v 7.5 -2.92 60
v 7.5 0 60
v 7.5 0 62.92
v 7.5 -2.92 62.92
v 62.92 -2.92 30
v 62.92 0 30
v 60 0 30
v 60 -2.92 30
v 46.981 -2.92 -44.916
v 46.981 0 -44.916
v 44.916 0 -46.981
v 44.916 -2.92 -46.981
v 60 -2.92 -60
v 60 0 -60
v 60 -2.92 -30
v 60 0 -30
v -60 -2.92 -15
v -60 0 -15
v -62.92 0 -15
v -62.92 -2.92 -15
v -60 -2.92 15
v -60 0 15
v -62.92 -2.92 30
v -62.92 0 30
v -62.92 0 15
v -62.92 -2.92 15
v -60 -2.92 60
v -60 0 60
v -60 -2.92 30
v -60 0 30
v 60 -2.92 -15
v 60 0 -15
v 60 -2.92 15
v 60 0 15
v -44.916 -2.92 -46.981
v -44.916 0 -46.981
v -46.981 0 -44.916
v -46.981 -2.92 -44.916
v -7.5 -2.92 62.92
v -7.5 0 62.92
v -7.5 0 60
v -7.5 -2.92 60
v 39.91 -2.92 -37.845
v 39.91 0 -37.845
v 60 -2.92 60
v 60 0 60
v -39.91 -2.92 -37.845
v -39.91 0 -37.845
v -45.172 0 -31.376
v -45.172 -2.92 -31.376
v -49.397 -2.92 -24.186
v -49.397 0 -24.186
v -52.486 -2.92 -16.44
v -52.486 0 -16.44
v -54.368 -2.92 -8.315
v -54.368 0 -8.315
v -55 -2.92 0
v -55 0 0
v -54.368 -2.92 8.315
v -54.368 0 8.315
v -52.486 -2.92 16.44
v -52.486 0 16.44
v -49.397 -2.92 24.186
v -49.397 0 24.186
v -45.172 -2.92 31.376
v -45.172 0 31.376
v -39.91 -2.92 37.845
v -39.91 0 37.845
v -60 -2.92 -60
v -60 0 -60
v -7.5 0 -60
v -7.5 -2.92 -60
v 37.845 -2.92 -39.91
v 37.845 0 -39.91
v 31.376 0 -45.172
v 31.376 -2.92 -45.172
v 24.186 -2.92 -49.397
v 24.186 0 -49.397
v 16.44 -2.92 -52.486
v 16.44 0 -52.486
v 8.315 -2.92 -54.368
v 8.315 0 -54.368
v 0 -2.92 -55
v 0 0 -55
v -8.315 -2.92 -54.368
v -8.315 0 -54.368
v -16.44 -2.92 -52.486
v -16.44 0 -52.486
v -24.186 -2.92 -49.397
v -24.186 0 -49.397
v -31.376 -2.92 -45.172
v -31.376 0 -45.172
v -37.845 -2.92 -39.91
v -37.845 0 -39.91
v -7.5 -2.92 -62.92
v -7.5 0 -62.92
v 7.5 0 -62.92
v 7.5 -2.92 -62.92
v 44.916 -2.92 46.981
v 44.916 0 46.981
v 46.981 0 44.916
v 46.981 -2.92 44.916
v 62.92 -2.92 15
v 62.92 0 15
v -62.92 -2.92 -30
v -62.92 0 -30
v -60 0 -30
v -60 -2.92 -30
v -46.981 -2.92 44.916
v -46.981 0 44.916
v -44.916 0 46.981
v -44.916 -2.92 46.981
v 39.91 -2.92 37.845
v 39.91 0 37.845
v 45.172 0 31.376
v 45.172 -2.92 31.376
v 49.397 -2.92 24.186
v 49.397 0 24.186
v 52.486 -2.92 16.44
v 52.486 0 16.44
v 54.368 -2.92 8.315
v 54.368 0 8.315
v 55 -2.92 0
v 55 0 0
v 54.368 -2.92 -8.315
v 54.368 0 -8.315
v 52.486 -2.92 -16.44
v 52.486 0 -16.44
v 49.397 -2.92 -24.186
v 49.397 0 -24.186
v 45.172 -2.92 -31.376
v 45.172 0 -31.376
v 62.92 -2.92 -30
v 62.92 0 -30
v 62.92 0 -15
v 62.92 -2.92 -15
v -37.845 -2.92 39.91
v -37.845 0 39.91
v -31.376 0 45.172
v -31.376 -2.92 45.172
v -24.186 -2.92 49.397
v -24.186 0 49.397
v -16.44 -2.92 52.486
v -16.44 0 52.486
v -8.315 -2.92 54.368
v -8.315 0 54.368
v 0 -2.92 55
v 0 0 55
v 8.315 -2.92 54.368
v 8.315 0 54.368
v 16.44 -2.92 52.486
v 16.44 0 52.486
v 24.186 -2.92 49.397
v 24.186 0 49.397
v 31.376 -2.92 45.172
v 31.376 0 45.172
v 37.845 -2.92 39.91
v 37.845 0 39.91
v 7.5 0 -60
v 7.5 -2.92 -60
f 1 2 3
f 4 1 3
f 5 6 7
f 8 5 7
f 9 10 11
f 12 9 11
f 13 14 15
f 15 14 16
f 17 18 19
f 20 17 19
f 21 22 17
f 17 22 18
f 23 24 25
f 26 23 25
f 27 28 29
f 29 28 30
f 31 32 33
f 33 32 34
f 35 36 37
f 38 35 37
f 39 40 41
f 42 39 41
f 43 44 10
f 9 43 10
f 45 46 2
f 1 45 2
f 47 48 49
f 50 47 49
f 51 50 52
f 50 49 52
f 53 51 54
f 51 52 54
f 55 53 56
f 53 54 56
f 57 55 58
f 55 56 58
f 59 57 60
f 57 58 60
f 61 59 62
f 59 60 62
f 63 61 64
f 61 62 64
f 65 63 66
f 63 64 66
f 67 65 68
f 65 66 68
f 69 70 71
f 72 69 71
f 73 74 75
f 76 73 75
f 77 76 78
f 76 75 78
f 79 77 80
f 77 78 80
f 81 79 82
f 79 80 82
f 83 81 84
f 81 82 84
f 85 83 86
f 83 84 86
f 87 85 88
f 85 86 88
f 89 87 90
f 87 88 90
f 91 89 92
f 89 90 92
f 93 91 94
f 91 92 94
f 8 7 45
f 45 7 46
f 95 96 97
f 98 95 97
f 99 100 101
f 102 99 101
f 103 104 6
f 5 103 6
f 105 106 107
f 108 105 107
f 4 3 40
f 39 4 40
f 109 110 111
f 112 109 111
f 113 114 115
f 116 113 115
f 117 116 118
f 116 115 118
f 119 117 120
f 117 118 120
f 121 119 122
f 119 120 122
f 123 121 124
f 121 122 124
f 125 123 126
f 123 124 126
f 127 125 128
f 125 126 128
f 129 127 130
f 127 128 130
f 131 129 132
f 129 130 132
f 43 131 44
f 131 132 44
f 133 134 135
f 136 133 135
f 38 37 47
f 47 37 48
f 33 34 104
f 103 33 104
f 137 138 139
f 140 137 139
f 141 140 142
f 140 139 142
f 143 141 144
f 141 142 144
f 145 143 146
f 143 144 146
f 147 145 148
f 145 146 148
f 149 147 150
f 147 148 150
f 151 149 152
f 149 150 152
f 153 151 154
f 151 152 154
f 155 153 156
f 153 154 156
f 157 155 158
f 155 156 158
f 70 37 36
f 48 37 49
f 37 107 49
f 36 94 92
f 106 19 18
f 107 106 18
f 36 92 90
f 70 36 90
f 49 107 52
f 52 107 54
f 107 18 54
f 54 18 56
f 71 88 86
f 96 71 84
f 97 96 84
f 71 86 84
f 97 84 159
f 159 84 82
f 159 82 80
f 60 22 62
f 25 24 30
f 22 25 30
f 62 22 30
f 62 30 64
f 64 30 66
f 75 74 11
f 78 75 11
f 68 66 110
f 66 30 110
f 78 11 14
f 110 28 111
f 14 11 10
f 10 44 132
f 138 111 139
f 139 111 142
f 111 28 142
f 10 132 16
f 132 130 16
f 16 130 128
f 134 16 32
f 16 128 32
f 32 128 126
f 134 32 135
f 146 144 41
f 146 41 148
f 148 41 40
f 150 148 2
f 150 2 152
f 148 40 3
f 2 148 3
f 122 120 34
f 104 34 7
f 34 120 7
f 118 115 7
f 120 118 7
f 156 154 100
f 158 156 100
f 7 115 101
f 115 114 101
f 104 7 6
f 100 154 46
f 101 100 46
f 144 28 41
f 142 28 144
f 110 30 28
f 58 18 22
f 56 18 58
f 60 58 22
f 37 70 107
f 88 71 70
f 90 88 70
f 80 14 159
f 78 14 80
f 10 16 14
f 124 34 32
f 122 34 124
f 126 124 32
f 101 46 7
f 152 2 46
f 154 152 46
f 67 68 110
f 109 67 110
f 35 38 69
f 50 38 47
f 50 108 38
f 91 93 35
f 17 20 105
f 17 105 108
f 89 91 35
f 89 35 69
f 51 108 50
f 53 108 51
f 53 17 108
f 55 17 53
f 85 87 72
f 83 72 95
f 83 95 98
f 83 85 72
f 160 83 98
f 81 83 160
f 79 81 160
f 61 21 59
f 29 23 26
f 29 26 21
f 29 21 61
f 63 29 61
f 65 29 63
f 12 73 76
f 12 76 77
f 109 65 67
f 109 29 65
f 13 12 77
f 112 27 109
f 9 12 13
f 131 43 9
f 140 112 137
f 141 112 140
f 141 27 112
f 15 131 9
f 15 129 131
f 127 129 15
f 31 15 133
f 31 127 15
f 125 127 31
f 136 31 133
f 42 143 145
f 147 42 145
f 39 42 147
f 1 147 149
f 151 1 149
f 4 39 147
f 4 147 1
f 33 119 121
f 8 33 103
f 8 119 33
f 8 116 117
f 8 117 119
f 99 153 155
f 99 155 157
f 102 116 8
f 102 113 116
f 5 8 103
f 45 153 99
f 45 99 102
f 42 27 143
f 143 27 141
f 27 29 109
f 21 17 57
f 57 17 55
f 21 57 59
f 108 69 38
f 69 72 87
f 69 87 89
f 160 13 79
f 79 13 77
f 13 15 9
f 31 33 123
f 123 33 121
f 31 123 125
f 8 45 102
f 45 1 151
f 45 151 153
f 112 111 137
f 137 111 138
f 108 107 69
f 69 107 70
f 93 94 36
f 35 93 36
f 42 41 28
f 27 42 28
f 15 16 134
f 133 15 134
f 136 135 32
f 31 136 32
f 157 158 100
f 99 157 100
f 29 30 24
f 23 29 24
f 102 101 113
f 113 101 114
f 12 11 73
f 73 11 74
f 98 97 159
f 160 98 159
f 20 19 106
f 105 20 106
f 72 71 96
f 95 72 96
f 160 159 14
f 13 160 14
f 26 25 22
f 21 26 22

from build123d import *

# Parameters (mm, degrees)
F2_DEPTH = 2.92


with BuildPart() as f2:
    # F1 (on Front) → F2 (new body)
    with BuildSketch(Plane.XZ):
        Polygon((-7.5, 60), (-60, 60), (-60, 30), (-62.92, 30), (-62.92, 15), (-60, 15), (-60, 0), (-60, -15), (-62.92, -15), (-62.92, -30), (-60, -30), (-60, -60), (-7.5, -60), (-7.5, -62.92), (7.5, -62.92), (7.5, -60), (60, -60), (60, -30), (62.92, -30), (62.92, -15), (60, -15), (60, 0), (60, 15), (62.92, 15), (62.92, 30), (60, 30), (60, 60), (7.5, 60), (7.5, 62.92), (-7.5, 62.92), align=None)
        with BuildLine():
            ThreePointArc((-39.9095440073, -37.8447922062), (-55, 0), (-39.9095440073, 37.8447922062))
            Line((-39.9095440073, 37.8447922062), (-46.9806118191, 44.9158600181))
            Line((-46.9806118191, 44.9158600181), (-44.9158600181, 46.9806118191))
            Line((-44.9158600181, 46.9806118191), (-37.8447922062, 39.9095440073))
            ThreePointArc((-37.8447922062, 39.9095440073), (0, 55), (37.8447922062, 39.9095440073))
            Line((37.8447922062, 39.9095440073), (44.9158600181, 46.9806118191))
            Line((44.9158600181, 46.9806118191), (46.9806118191, 44.9158600181))
            Line((46.9806118191, 44.9158600181), (39.9095440073, 37.8447922062))
            ThreePointArc((39.9095440073, 37.8447922062), (55, 0), (39.9095440073, -37.8447922062))
            Line((39.9095440073, -37.8447922062), (46.9806118191, -44.9158600181))
            Line((46.9806118191, -44.9158600181), (44.9158600181, -46.9806118191))
            Line((44.9158600181, -46.9806118191), (37.8447922062, -39.9095440073))
            ThreePointArc((37.8447922062, -39.9095440073), (0, -55), (-37.8447922062, -39.9095440073))
            Line((-37.8447922062, -39.9095440073), (-44.9158600181, -46.9806118191))
            Line((-44.9158600181, -46.9806118191), (-46.9806118191, -44.9158600181))
            Line((-46.9806118191, -44.9158600181), (-39.9095440073, -37.8447922062))
        make_face(mode=Mode.SUBTRACT)
    extrude(amount=F2_DEPTH)


solid = f2.part
